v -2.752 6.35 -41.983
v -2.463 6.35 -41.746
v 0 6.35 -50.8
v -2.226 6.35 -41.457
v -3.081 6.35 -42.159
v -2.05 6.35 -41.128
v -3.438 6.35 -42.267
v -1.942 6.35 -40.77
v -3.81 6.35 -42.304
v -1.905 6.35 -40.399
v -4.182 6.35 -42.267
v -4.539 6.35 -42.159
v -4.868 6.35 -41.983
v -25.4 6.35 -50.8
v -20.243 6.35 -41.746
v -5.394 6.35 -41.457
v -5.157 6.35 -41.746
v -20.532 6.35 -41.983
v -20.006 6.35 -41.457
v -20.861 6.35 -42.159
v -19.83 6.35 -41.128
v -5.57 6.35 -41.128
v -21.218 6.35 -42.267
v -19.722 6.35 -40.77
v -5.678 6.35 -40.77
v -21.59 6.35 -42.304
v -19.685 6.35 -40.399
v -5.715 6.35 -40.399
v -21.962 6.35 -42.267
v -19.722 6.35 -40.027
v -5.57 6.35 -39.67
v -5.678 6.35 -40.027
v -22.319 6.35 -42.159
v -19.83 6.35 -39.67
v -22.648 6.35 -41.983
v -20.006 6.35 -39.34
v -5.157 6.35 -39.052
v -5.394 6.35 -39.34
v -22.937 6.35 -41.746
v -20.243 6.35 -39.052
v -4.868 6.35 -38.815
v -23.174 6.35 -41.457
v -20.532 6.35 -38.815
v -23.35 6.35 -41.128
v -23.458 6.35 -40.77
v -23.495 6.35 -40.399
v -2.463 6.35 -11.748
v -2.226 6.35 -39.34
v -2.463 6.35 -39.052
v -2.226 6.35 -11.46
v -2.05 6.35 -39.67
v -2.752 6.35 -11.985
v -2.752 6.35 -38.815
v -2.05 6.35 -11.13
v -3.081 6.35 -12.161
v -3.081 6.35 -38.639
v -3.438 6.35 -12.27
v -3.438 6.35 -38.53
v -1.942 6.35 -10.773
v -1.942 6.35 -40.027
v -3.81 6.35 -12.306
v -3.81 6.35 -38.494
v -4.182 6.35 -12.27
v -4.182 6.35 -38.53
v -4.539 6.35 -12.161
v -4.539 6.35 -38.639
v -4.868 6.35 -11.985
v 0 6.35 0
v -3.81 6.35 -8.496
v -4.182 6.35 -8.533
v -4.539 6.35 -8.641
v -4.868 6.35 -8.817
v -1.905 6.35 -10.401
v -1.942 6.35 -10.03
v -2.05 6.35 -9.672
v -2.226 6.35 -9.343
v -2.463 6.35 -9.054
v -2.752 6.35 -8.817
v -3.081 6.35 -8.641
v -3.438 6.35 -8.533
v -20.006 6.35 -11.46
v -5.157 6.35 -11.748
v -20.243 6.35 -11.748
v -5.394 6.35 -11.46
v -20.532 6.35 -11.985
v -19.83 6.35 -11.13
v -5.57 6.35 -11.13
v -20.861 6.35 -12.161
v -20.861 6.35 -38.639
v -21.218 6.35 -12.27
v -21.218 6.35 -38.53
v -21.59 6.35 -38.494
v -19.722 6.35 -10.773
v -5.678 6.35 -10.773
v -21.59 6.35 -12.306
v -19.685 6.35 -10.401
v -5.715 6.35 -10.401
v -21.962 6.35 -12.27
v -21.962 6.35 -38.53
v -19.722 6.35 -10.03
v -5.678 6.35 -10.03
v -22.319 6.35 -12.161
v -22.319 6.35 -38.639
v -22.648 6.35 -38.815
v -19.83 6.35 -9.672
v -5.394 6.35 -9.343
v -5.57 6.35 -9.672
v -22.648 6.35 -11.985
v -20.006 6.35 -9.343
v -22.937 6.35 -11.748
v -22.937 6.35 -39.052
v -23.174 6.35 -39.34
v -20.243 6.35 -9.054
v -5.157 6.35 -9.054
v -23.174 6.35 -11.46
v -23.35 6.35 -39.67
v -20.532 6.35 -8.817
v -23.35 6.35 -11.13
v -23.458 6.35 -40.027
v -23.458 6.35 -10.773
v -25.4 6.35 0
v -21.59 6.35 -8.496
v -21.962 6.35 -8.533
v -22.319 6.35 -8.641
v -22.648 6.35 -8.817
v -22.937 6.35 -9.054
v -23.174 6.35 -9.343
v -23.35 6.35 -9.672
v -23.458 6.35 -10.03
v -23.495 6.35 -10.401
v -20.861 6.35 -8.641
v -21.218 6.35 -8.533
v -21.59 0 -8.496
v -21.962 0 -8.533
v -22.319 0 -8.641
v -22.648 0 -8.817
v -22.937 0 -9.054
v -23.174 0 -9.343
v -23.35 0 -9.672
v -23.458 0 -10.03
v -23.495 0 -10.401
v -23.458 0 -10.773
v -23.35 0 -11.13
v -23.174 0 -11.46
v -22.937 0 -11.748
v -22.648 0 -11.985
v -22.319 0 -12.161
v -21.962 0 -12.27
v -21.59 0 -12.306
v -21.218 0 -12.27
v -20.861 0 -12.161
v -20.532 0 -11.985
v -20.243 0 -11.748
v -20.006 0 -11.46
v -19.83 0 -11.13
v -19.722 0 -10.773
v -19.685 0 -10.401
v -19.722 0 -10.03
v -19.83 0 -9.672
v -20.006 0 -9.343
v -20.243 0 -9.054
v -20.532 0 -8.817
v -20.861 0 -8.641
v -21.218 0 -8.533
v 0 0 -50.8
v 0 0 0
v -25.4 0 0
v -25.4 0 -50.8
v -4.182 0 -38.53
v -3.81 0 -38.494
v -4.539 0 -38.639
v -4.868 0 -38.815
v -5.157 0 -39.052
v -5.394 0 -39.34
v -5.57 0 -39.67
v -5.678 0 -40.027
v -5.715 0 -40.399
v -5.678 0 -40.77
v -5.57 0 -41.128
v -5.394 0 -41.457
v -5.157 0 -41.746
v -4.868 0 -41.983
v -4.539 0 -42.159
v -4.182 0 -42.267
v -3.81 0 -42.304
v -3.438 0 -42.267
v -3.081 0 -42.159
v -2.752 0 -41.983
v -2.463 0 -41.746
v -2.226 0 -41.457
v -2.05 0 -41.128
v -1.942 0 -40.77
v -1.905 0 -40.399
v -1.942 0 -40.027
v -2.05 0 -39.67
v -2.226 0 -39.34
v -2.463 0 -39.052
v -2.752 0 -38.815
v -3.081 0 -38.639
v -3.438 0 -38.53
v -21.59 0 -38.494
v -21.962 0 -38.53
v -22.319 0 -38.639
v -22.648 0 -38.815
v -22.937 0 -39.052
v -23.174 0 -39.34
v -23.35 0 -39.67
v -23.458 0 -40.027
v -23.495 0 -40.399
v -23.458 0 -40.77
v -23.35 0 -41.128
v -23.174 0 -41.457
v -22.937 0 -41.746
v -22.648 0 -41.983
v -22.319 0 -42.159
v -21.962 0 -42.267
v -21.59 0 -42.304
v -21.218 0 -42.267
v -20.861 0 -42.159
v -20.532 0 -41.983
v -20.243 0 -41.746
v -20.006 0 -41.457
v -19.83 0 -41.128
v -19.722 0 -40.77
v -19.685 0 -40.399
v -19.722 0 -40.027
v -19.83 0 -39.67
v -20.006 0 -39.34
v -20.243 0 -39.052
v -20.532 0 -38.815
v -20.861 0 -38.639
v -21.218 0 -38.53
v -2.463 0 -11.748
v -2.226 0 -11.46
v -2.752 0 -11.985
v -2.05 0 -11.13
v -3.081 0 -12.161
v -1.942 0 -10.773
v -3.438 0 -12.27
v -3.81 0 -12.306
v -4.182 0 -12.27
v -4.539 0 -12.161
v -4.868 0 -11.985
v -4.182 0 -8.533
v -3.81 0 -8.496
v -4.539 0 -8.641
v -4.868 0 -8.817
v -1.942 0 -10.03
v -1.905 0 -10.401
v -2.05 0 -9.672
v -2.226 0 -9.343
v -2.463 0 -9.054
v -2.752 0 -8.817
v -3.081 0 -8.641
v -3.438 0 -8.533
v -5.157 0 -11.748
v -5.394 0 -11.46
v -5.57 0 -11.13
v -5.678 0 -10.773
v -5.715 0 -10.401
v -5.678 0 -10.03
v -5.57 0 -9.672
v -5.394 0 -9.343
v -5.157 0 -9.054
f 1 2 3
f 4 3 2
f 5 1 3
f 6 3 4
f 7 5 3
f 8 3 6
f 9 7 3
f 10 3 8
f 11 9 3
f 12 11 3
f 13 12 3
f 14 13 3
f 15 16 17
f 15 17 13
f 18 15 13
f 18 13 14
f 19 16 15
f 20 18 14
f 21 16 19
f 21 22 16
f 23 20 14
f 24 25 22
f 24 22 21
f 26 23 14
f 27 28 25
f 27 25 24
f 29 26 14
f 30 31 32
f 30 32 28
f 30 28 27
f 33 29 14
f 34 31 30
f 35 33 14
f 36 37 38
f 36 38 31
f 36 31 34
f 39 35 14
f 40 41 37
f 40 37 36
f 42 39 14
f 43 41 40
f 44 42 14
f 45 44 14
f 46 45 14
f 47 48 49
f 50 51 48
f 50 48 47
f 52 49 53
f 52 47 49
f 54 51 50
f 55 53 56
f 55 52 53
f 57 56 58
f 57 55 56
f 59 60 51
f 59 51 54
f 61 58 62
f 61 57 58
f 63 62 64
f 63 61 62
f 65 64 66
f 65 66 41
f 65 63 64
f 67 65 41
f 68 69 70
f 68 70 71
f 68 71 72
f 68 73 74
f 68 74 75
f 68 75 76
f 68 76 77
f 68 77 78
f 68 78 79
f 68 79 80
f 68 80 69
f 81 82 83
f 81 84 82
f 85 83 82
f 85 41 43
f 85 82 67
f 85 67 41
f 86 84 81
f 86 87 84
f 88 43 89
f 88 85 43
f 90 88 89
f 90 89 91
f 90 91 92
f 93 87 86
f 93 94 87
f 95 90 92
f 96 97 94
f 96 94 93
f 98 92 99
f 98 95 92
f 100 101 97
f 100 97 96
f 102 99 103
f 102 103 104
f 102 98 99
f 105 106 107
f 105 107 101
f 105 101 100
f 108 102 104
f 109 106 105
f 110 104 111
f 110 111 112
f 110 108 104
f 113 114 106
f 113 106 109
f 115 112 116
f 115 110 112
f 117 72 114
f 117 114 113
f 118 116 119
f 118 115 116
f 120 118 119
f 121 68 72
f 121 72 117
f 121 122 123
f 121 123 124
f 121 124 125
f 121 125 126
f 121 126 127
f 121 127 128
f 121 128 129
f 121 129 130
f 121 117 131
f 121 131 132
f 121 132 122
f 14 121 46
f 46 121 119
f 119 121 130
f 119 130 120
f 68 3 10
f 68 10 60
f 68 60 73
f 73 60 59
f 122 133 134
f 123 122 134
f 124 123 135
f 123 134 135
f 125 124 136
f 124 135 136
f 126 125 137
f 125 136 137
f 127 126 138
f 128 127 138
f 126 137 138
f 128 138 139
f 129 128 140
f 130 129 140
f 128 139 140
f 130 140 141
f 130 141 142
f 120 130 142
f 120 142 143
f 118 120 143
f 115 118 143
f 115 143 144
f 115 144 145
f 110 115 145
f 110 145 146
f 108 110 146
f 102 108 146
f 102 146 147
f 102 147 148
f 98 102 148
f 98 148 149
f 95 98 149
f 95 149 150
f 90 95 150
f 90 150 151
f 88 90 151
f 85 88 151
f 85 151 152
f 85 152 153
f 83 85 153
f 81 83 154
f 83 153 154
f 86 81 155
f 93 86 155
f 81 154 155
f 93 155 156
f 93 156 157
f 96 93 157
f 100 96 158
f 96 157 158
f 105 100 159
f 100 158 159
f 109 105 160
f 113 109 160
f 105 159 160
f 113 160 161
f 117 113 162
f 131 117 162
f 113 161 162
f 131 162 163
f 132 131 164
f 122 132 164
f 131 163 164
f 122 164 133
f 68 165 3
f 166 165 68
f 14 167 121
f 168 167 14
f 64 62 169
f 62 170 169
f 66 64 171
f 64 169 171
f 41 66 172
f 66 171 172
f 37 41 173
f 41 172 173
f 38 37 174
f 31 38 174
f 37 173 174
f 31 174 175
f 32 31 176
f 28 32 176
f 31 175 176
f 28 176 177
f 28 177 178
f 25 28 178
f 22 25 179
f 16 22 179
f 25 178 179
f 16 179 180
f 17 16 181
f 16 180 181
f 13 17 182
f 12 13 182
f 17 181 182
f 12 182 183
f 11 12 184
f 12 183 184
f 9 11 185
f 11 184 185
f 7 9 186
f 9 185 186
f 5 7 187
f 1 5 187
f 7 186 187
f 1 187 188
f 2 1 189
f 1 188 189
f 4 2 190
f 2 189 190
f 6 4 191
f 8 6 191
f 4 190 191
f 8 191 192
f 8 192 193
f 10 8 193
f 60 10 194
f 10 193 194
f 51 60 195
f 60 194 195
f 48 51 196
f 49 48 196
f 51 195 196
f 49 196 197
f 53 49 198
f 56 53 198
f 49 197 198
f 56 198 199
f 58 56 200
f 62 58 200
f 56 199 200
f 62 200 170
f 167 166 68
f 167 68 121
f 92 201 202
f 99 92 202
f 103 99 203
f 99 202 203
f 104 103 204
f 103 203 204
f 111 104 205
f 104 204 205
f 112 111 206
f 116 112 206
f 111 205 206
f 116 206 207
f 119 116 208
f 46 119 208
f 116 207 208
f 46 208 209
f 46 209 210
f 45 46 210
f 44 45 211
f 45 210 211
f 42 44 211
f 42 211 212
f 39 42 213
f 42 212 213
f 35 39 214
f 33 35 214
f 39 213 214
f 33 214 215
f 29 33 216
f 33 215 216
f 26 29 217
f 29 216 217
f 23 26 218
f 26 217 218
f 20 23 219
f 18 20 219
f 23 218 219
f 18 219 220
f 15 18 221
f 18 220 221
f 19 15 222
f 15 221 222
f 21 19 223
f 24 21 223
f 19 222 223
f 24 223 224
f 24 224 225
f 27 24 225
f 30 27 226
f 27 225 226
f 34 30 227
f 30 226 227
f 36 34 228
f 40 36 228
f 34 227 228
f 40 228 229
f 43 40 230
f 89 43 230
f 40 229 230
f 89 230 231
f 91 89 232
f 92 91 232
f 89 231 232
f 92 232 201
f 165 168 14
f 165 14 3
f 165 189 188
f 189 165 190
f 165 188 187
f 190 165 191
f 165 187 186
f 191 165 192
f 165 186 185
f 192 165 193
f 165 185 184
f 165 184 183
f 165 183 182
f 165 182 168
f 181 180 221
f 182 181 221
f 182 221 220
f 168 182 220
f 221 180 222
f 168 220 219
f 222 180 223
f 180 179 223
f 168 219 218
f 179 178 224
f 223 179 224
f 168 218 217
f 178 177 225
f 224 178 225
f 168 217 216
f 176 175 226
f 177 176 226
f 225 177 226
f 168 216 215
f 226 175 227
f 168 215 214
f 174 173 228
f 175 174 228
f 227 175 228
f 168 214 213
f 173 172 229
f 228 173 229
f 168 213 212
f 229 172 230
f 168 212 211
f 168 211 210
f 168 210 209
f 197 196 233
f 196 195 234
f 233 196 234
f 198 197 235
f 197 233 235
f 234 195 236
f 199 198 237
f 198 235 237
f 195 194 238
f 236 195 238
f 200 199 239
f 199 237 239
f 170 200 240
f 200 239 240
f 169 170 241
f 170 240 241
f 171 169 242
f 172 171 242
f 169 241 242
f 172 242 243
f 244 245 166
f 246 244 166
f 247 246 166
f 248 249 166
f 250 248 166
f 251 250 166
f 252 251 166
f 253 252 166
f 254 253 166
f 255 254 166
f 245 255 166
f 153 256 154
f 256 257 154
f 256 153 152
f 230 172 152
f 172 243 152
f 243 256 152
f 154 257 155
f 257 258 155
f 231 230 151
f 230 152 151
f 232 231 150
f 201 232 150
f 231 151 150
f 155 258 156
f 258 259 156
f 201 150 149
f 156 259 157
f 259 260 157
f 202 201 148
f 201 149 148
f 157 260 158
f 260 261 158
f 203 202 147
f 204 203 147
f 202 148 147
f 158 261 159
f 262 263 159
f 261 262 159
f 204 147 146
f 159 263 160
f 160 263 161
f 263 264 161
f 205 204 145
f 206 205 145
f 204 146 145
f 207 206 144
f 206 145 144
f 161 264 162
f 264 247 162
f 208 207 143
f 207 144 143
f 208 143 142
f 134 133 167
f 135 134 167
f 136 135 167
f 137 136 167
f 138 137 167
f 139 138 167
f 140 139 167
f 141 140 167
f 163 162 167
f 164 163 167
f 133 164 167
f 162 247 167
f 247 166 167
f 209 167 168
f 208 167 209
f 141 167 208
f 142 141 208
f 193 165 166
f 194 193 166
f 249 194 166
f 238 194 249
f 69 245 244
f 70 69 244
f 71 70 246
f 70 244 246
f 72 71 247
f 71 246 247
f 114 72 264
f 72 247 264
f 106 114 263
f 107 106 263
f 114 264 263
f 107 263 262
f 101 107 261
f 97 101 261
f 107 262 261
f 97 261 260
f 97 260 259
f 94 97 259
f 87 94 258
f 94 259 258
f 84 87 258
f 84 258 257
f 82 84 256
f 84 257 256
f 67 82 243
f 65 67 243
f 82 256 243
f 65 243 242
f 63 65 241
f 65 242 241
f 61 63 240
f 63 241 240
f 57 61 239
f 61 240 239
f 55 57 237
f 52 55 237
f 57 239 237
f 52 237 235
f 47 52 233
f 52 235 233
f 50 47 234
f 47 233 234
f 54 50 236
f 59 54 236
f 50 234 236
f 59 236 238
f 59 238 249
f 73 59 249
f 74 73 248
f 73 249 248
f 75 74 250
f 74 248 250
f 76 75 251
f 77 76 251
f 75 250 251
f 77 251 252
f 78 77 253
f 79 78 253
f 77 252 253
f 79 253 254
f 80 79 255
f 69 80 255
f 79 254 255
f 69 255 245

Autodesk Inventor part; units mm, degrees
ref_plane "YZ Plane" through (0, 0, 0) normal (1, 0, 0) x (0, 1, 0)
ref_plane "XZ Plane" through (0, 0, 0) normal (0, 1, 0) x (-1, 0, 0)
ref_plane "XY Plane" through (0, 0, 0) normal (0, 0, 1) x (1, 0, 0)
sketch "Sketch1" plane through (0, 0, 0) normal (0, 1, 0) x (-1, 0, 0)
  line L0 (0, 0) -> (25.4, 0)
  line L1 (25.4, 0) -> (25.4, -50.8)
  line L2 (25.4, -50.8) -> (0, -50.8)
  line L3 (0, -50.8) -> (0, 0)
  dimension "d0" = 50.8
  dimension "d1" = 25.4
extrude "Extrusion1" add sketch "Sketch1" along normal blind 6.35
sketch "Sketch2" plane through (0, 6.35, 0) normal (0, 1, 0) x (1, 0, 0)
  line L0 (-25.4, 0) -> (0, 0) projected
  line L1 (0, 0) -> (0, 50.8) projected
  line L2 (0, 50.8) -> (-25.4, 50.8) projected
  line L3 (-25.4, 50.8) -> (-25.4, 0) projected
  point P0 (-21.59, 10.4013)
  point P1 (-21.59, 40.3987)
  point P2 (-3.81, 10.4013)
  point P3 (-3.81, 40.3987)
  dimension "d4" = 29.9974
  dimension "d5" = 50.8
  dimension "d6" = 10.4013
  dimension "d9" = 29.9974
  dimension "d10" = 3.81
  dimension "d11" = 3.81
  dimension "d12" = 3.81
  dimension "d13" = 3.81
  dimension "d14" = 10.4013
hole "Hole1" at (-21.59, 6.35, -10.4013) at (-21.59, 6.35, -40.3987) at (-3.81, 6.35, -10.4013) at (-3.81, 6.35, -40.3987) direction (0, -1, 0) diameter 3.81 depth 25.4 tip angle 118
equation "\"d6\" = -0.5 * d4 + 0.5 * d5"
equation "\"d9\" = d4"
equation "\"d11\" = d10"
equation "\"d12\" = d10"
equation "\"d13\" = d10"
equation "\"d14\" = d6"
properties part number "20X20 carege"
